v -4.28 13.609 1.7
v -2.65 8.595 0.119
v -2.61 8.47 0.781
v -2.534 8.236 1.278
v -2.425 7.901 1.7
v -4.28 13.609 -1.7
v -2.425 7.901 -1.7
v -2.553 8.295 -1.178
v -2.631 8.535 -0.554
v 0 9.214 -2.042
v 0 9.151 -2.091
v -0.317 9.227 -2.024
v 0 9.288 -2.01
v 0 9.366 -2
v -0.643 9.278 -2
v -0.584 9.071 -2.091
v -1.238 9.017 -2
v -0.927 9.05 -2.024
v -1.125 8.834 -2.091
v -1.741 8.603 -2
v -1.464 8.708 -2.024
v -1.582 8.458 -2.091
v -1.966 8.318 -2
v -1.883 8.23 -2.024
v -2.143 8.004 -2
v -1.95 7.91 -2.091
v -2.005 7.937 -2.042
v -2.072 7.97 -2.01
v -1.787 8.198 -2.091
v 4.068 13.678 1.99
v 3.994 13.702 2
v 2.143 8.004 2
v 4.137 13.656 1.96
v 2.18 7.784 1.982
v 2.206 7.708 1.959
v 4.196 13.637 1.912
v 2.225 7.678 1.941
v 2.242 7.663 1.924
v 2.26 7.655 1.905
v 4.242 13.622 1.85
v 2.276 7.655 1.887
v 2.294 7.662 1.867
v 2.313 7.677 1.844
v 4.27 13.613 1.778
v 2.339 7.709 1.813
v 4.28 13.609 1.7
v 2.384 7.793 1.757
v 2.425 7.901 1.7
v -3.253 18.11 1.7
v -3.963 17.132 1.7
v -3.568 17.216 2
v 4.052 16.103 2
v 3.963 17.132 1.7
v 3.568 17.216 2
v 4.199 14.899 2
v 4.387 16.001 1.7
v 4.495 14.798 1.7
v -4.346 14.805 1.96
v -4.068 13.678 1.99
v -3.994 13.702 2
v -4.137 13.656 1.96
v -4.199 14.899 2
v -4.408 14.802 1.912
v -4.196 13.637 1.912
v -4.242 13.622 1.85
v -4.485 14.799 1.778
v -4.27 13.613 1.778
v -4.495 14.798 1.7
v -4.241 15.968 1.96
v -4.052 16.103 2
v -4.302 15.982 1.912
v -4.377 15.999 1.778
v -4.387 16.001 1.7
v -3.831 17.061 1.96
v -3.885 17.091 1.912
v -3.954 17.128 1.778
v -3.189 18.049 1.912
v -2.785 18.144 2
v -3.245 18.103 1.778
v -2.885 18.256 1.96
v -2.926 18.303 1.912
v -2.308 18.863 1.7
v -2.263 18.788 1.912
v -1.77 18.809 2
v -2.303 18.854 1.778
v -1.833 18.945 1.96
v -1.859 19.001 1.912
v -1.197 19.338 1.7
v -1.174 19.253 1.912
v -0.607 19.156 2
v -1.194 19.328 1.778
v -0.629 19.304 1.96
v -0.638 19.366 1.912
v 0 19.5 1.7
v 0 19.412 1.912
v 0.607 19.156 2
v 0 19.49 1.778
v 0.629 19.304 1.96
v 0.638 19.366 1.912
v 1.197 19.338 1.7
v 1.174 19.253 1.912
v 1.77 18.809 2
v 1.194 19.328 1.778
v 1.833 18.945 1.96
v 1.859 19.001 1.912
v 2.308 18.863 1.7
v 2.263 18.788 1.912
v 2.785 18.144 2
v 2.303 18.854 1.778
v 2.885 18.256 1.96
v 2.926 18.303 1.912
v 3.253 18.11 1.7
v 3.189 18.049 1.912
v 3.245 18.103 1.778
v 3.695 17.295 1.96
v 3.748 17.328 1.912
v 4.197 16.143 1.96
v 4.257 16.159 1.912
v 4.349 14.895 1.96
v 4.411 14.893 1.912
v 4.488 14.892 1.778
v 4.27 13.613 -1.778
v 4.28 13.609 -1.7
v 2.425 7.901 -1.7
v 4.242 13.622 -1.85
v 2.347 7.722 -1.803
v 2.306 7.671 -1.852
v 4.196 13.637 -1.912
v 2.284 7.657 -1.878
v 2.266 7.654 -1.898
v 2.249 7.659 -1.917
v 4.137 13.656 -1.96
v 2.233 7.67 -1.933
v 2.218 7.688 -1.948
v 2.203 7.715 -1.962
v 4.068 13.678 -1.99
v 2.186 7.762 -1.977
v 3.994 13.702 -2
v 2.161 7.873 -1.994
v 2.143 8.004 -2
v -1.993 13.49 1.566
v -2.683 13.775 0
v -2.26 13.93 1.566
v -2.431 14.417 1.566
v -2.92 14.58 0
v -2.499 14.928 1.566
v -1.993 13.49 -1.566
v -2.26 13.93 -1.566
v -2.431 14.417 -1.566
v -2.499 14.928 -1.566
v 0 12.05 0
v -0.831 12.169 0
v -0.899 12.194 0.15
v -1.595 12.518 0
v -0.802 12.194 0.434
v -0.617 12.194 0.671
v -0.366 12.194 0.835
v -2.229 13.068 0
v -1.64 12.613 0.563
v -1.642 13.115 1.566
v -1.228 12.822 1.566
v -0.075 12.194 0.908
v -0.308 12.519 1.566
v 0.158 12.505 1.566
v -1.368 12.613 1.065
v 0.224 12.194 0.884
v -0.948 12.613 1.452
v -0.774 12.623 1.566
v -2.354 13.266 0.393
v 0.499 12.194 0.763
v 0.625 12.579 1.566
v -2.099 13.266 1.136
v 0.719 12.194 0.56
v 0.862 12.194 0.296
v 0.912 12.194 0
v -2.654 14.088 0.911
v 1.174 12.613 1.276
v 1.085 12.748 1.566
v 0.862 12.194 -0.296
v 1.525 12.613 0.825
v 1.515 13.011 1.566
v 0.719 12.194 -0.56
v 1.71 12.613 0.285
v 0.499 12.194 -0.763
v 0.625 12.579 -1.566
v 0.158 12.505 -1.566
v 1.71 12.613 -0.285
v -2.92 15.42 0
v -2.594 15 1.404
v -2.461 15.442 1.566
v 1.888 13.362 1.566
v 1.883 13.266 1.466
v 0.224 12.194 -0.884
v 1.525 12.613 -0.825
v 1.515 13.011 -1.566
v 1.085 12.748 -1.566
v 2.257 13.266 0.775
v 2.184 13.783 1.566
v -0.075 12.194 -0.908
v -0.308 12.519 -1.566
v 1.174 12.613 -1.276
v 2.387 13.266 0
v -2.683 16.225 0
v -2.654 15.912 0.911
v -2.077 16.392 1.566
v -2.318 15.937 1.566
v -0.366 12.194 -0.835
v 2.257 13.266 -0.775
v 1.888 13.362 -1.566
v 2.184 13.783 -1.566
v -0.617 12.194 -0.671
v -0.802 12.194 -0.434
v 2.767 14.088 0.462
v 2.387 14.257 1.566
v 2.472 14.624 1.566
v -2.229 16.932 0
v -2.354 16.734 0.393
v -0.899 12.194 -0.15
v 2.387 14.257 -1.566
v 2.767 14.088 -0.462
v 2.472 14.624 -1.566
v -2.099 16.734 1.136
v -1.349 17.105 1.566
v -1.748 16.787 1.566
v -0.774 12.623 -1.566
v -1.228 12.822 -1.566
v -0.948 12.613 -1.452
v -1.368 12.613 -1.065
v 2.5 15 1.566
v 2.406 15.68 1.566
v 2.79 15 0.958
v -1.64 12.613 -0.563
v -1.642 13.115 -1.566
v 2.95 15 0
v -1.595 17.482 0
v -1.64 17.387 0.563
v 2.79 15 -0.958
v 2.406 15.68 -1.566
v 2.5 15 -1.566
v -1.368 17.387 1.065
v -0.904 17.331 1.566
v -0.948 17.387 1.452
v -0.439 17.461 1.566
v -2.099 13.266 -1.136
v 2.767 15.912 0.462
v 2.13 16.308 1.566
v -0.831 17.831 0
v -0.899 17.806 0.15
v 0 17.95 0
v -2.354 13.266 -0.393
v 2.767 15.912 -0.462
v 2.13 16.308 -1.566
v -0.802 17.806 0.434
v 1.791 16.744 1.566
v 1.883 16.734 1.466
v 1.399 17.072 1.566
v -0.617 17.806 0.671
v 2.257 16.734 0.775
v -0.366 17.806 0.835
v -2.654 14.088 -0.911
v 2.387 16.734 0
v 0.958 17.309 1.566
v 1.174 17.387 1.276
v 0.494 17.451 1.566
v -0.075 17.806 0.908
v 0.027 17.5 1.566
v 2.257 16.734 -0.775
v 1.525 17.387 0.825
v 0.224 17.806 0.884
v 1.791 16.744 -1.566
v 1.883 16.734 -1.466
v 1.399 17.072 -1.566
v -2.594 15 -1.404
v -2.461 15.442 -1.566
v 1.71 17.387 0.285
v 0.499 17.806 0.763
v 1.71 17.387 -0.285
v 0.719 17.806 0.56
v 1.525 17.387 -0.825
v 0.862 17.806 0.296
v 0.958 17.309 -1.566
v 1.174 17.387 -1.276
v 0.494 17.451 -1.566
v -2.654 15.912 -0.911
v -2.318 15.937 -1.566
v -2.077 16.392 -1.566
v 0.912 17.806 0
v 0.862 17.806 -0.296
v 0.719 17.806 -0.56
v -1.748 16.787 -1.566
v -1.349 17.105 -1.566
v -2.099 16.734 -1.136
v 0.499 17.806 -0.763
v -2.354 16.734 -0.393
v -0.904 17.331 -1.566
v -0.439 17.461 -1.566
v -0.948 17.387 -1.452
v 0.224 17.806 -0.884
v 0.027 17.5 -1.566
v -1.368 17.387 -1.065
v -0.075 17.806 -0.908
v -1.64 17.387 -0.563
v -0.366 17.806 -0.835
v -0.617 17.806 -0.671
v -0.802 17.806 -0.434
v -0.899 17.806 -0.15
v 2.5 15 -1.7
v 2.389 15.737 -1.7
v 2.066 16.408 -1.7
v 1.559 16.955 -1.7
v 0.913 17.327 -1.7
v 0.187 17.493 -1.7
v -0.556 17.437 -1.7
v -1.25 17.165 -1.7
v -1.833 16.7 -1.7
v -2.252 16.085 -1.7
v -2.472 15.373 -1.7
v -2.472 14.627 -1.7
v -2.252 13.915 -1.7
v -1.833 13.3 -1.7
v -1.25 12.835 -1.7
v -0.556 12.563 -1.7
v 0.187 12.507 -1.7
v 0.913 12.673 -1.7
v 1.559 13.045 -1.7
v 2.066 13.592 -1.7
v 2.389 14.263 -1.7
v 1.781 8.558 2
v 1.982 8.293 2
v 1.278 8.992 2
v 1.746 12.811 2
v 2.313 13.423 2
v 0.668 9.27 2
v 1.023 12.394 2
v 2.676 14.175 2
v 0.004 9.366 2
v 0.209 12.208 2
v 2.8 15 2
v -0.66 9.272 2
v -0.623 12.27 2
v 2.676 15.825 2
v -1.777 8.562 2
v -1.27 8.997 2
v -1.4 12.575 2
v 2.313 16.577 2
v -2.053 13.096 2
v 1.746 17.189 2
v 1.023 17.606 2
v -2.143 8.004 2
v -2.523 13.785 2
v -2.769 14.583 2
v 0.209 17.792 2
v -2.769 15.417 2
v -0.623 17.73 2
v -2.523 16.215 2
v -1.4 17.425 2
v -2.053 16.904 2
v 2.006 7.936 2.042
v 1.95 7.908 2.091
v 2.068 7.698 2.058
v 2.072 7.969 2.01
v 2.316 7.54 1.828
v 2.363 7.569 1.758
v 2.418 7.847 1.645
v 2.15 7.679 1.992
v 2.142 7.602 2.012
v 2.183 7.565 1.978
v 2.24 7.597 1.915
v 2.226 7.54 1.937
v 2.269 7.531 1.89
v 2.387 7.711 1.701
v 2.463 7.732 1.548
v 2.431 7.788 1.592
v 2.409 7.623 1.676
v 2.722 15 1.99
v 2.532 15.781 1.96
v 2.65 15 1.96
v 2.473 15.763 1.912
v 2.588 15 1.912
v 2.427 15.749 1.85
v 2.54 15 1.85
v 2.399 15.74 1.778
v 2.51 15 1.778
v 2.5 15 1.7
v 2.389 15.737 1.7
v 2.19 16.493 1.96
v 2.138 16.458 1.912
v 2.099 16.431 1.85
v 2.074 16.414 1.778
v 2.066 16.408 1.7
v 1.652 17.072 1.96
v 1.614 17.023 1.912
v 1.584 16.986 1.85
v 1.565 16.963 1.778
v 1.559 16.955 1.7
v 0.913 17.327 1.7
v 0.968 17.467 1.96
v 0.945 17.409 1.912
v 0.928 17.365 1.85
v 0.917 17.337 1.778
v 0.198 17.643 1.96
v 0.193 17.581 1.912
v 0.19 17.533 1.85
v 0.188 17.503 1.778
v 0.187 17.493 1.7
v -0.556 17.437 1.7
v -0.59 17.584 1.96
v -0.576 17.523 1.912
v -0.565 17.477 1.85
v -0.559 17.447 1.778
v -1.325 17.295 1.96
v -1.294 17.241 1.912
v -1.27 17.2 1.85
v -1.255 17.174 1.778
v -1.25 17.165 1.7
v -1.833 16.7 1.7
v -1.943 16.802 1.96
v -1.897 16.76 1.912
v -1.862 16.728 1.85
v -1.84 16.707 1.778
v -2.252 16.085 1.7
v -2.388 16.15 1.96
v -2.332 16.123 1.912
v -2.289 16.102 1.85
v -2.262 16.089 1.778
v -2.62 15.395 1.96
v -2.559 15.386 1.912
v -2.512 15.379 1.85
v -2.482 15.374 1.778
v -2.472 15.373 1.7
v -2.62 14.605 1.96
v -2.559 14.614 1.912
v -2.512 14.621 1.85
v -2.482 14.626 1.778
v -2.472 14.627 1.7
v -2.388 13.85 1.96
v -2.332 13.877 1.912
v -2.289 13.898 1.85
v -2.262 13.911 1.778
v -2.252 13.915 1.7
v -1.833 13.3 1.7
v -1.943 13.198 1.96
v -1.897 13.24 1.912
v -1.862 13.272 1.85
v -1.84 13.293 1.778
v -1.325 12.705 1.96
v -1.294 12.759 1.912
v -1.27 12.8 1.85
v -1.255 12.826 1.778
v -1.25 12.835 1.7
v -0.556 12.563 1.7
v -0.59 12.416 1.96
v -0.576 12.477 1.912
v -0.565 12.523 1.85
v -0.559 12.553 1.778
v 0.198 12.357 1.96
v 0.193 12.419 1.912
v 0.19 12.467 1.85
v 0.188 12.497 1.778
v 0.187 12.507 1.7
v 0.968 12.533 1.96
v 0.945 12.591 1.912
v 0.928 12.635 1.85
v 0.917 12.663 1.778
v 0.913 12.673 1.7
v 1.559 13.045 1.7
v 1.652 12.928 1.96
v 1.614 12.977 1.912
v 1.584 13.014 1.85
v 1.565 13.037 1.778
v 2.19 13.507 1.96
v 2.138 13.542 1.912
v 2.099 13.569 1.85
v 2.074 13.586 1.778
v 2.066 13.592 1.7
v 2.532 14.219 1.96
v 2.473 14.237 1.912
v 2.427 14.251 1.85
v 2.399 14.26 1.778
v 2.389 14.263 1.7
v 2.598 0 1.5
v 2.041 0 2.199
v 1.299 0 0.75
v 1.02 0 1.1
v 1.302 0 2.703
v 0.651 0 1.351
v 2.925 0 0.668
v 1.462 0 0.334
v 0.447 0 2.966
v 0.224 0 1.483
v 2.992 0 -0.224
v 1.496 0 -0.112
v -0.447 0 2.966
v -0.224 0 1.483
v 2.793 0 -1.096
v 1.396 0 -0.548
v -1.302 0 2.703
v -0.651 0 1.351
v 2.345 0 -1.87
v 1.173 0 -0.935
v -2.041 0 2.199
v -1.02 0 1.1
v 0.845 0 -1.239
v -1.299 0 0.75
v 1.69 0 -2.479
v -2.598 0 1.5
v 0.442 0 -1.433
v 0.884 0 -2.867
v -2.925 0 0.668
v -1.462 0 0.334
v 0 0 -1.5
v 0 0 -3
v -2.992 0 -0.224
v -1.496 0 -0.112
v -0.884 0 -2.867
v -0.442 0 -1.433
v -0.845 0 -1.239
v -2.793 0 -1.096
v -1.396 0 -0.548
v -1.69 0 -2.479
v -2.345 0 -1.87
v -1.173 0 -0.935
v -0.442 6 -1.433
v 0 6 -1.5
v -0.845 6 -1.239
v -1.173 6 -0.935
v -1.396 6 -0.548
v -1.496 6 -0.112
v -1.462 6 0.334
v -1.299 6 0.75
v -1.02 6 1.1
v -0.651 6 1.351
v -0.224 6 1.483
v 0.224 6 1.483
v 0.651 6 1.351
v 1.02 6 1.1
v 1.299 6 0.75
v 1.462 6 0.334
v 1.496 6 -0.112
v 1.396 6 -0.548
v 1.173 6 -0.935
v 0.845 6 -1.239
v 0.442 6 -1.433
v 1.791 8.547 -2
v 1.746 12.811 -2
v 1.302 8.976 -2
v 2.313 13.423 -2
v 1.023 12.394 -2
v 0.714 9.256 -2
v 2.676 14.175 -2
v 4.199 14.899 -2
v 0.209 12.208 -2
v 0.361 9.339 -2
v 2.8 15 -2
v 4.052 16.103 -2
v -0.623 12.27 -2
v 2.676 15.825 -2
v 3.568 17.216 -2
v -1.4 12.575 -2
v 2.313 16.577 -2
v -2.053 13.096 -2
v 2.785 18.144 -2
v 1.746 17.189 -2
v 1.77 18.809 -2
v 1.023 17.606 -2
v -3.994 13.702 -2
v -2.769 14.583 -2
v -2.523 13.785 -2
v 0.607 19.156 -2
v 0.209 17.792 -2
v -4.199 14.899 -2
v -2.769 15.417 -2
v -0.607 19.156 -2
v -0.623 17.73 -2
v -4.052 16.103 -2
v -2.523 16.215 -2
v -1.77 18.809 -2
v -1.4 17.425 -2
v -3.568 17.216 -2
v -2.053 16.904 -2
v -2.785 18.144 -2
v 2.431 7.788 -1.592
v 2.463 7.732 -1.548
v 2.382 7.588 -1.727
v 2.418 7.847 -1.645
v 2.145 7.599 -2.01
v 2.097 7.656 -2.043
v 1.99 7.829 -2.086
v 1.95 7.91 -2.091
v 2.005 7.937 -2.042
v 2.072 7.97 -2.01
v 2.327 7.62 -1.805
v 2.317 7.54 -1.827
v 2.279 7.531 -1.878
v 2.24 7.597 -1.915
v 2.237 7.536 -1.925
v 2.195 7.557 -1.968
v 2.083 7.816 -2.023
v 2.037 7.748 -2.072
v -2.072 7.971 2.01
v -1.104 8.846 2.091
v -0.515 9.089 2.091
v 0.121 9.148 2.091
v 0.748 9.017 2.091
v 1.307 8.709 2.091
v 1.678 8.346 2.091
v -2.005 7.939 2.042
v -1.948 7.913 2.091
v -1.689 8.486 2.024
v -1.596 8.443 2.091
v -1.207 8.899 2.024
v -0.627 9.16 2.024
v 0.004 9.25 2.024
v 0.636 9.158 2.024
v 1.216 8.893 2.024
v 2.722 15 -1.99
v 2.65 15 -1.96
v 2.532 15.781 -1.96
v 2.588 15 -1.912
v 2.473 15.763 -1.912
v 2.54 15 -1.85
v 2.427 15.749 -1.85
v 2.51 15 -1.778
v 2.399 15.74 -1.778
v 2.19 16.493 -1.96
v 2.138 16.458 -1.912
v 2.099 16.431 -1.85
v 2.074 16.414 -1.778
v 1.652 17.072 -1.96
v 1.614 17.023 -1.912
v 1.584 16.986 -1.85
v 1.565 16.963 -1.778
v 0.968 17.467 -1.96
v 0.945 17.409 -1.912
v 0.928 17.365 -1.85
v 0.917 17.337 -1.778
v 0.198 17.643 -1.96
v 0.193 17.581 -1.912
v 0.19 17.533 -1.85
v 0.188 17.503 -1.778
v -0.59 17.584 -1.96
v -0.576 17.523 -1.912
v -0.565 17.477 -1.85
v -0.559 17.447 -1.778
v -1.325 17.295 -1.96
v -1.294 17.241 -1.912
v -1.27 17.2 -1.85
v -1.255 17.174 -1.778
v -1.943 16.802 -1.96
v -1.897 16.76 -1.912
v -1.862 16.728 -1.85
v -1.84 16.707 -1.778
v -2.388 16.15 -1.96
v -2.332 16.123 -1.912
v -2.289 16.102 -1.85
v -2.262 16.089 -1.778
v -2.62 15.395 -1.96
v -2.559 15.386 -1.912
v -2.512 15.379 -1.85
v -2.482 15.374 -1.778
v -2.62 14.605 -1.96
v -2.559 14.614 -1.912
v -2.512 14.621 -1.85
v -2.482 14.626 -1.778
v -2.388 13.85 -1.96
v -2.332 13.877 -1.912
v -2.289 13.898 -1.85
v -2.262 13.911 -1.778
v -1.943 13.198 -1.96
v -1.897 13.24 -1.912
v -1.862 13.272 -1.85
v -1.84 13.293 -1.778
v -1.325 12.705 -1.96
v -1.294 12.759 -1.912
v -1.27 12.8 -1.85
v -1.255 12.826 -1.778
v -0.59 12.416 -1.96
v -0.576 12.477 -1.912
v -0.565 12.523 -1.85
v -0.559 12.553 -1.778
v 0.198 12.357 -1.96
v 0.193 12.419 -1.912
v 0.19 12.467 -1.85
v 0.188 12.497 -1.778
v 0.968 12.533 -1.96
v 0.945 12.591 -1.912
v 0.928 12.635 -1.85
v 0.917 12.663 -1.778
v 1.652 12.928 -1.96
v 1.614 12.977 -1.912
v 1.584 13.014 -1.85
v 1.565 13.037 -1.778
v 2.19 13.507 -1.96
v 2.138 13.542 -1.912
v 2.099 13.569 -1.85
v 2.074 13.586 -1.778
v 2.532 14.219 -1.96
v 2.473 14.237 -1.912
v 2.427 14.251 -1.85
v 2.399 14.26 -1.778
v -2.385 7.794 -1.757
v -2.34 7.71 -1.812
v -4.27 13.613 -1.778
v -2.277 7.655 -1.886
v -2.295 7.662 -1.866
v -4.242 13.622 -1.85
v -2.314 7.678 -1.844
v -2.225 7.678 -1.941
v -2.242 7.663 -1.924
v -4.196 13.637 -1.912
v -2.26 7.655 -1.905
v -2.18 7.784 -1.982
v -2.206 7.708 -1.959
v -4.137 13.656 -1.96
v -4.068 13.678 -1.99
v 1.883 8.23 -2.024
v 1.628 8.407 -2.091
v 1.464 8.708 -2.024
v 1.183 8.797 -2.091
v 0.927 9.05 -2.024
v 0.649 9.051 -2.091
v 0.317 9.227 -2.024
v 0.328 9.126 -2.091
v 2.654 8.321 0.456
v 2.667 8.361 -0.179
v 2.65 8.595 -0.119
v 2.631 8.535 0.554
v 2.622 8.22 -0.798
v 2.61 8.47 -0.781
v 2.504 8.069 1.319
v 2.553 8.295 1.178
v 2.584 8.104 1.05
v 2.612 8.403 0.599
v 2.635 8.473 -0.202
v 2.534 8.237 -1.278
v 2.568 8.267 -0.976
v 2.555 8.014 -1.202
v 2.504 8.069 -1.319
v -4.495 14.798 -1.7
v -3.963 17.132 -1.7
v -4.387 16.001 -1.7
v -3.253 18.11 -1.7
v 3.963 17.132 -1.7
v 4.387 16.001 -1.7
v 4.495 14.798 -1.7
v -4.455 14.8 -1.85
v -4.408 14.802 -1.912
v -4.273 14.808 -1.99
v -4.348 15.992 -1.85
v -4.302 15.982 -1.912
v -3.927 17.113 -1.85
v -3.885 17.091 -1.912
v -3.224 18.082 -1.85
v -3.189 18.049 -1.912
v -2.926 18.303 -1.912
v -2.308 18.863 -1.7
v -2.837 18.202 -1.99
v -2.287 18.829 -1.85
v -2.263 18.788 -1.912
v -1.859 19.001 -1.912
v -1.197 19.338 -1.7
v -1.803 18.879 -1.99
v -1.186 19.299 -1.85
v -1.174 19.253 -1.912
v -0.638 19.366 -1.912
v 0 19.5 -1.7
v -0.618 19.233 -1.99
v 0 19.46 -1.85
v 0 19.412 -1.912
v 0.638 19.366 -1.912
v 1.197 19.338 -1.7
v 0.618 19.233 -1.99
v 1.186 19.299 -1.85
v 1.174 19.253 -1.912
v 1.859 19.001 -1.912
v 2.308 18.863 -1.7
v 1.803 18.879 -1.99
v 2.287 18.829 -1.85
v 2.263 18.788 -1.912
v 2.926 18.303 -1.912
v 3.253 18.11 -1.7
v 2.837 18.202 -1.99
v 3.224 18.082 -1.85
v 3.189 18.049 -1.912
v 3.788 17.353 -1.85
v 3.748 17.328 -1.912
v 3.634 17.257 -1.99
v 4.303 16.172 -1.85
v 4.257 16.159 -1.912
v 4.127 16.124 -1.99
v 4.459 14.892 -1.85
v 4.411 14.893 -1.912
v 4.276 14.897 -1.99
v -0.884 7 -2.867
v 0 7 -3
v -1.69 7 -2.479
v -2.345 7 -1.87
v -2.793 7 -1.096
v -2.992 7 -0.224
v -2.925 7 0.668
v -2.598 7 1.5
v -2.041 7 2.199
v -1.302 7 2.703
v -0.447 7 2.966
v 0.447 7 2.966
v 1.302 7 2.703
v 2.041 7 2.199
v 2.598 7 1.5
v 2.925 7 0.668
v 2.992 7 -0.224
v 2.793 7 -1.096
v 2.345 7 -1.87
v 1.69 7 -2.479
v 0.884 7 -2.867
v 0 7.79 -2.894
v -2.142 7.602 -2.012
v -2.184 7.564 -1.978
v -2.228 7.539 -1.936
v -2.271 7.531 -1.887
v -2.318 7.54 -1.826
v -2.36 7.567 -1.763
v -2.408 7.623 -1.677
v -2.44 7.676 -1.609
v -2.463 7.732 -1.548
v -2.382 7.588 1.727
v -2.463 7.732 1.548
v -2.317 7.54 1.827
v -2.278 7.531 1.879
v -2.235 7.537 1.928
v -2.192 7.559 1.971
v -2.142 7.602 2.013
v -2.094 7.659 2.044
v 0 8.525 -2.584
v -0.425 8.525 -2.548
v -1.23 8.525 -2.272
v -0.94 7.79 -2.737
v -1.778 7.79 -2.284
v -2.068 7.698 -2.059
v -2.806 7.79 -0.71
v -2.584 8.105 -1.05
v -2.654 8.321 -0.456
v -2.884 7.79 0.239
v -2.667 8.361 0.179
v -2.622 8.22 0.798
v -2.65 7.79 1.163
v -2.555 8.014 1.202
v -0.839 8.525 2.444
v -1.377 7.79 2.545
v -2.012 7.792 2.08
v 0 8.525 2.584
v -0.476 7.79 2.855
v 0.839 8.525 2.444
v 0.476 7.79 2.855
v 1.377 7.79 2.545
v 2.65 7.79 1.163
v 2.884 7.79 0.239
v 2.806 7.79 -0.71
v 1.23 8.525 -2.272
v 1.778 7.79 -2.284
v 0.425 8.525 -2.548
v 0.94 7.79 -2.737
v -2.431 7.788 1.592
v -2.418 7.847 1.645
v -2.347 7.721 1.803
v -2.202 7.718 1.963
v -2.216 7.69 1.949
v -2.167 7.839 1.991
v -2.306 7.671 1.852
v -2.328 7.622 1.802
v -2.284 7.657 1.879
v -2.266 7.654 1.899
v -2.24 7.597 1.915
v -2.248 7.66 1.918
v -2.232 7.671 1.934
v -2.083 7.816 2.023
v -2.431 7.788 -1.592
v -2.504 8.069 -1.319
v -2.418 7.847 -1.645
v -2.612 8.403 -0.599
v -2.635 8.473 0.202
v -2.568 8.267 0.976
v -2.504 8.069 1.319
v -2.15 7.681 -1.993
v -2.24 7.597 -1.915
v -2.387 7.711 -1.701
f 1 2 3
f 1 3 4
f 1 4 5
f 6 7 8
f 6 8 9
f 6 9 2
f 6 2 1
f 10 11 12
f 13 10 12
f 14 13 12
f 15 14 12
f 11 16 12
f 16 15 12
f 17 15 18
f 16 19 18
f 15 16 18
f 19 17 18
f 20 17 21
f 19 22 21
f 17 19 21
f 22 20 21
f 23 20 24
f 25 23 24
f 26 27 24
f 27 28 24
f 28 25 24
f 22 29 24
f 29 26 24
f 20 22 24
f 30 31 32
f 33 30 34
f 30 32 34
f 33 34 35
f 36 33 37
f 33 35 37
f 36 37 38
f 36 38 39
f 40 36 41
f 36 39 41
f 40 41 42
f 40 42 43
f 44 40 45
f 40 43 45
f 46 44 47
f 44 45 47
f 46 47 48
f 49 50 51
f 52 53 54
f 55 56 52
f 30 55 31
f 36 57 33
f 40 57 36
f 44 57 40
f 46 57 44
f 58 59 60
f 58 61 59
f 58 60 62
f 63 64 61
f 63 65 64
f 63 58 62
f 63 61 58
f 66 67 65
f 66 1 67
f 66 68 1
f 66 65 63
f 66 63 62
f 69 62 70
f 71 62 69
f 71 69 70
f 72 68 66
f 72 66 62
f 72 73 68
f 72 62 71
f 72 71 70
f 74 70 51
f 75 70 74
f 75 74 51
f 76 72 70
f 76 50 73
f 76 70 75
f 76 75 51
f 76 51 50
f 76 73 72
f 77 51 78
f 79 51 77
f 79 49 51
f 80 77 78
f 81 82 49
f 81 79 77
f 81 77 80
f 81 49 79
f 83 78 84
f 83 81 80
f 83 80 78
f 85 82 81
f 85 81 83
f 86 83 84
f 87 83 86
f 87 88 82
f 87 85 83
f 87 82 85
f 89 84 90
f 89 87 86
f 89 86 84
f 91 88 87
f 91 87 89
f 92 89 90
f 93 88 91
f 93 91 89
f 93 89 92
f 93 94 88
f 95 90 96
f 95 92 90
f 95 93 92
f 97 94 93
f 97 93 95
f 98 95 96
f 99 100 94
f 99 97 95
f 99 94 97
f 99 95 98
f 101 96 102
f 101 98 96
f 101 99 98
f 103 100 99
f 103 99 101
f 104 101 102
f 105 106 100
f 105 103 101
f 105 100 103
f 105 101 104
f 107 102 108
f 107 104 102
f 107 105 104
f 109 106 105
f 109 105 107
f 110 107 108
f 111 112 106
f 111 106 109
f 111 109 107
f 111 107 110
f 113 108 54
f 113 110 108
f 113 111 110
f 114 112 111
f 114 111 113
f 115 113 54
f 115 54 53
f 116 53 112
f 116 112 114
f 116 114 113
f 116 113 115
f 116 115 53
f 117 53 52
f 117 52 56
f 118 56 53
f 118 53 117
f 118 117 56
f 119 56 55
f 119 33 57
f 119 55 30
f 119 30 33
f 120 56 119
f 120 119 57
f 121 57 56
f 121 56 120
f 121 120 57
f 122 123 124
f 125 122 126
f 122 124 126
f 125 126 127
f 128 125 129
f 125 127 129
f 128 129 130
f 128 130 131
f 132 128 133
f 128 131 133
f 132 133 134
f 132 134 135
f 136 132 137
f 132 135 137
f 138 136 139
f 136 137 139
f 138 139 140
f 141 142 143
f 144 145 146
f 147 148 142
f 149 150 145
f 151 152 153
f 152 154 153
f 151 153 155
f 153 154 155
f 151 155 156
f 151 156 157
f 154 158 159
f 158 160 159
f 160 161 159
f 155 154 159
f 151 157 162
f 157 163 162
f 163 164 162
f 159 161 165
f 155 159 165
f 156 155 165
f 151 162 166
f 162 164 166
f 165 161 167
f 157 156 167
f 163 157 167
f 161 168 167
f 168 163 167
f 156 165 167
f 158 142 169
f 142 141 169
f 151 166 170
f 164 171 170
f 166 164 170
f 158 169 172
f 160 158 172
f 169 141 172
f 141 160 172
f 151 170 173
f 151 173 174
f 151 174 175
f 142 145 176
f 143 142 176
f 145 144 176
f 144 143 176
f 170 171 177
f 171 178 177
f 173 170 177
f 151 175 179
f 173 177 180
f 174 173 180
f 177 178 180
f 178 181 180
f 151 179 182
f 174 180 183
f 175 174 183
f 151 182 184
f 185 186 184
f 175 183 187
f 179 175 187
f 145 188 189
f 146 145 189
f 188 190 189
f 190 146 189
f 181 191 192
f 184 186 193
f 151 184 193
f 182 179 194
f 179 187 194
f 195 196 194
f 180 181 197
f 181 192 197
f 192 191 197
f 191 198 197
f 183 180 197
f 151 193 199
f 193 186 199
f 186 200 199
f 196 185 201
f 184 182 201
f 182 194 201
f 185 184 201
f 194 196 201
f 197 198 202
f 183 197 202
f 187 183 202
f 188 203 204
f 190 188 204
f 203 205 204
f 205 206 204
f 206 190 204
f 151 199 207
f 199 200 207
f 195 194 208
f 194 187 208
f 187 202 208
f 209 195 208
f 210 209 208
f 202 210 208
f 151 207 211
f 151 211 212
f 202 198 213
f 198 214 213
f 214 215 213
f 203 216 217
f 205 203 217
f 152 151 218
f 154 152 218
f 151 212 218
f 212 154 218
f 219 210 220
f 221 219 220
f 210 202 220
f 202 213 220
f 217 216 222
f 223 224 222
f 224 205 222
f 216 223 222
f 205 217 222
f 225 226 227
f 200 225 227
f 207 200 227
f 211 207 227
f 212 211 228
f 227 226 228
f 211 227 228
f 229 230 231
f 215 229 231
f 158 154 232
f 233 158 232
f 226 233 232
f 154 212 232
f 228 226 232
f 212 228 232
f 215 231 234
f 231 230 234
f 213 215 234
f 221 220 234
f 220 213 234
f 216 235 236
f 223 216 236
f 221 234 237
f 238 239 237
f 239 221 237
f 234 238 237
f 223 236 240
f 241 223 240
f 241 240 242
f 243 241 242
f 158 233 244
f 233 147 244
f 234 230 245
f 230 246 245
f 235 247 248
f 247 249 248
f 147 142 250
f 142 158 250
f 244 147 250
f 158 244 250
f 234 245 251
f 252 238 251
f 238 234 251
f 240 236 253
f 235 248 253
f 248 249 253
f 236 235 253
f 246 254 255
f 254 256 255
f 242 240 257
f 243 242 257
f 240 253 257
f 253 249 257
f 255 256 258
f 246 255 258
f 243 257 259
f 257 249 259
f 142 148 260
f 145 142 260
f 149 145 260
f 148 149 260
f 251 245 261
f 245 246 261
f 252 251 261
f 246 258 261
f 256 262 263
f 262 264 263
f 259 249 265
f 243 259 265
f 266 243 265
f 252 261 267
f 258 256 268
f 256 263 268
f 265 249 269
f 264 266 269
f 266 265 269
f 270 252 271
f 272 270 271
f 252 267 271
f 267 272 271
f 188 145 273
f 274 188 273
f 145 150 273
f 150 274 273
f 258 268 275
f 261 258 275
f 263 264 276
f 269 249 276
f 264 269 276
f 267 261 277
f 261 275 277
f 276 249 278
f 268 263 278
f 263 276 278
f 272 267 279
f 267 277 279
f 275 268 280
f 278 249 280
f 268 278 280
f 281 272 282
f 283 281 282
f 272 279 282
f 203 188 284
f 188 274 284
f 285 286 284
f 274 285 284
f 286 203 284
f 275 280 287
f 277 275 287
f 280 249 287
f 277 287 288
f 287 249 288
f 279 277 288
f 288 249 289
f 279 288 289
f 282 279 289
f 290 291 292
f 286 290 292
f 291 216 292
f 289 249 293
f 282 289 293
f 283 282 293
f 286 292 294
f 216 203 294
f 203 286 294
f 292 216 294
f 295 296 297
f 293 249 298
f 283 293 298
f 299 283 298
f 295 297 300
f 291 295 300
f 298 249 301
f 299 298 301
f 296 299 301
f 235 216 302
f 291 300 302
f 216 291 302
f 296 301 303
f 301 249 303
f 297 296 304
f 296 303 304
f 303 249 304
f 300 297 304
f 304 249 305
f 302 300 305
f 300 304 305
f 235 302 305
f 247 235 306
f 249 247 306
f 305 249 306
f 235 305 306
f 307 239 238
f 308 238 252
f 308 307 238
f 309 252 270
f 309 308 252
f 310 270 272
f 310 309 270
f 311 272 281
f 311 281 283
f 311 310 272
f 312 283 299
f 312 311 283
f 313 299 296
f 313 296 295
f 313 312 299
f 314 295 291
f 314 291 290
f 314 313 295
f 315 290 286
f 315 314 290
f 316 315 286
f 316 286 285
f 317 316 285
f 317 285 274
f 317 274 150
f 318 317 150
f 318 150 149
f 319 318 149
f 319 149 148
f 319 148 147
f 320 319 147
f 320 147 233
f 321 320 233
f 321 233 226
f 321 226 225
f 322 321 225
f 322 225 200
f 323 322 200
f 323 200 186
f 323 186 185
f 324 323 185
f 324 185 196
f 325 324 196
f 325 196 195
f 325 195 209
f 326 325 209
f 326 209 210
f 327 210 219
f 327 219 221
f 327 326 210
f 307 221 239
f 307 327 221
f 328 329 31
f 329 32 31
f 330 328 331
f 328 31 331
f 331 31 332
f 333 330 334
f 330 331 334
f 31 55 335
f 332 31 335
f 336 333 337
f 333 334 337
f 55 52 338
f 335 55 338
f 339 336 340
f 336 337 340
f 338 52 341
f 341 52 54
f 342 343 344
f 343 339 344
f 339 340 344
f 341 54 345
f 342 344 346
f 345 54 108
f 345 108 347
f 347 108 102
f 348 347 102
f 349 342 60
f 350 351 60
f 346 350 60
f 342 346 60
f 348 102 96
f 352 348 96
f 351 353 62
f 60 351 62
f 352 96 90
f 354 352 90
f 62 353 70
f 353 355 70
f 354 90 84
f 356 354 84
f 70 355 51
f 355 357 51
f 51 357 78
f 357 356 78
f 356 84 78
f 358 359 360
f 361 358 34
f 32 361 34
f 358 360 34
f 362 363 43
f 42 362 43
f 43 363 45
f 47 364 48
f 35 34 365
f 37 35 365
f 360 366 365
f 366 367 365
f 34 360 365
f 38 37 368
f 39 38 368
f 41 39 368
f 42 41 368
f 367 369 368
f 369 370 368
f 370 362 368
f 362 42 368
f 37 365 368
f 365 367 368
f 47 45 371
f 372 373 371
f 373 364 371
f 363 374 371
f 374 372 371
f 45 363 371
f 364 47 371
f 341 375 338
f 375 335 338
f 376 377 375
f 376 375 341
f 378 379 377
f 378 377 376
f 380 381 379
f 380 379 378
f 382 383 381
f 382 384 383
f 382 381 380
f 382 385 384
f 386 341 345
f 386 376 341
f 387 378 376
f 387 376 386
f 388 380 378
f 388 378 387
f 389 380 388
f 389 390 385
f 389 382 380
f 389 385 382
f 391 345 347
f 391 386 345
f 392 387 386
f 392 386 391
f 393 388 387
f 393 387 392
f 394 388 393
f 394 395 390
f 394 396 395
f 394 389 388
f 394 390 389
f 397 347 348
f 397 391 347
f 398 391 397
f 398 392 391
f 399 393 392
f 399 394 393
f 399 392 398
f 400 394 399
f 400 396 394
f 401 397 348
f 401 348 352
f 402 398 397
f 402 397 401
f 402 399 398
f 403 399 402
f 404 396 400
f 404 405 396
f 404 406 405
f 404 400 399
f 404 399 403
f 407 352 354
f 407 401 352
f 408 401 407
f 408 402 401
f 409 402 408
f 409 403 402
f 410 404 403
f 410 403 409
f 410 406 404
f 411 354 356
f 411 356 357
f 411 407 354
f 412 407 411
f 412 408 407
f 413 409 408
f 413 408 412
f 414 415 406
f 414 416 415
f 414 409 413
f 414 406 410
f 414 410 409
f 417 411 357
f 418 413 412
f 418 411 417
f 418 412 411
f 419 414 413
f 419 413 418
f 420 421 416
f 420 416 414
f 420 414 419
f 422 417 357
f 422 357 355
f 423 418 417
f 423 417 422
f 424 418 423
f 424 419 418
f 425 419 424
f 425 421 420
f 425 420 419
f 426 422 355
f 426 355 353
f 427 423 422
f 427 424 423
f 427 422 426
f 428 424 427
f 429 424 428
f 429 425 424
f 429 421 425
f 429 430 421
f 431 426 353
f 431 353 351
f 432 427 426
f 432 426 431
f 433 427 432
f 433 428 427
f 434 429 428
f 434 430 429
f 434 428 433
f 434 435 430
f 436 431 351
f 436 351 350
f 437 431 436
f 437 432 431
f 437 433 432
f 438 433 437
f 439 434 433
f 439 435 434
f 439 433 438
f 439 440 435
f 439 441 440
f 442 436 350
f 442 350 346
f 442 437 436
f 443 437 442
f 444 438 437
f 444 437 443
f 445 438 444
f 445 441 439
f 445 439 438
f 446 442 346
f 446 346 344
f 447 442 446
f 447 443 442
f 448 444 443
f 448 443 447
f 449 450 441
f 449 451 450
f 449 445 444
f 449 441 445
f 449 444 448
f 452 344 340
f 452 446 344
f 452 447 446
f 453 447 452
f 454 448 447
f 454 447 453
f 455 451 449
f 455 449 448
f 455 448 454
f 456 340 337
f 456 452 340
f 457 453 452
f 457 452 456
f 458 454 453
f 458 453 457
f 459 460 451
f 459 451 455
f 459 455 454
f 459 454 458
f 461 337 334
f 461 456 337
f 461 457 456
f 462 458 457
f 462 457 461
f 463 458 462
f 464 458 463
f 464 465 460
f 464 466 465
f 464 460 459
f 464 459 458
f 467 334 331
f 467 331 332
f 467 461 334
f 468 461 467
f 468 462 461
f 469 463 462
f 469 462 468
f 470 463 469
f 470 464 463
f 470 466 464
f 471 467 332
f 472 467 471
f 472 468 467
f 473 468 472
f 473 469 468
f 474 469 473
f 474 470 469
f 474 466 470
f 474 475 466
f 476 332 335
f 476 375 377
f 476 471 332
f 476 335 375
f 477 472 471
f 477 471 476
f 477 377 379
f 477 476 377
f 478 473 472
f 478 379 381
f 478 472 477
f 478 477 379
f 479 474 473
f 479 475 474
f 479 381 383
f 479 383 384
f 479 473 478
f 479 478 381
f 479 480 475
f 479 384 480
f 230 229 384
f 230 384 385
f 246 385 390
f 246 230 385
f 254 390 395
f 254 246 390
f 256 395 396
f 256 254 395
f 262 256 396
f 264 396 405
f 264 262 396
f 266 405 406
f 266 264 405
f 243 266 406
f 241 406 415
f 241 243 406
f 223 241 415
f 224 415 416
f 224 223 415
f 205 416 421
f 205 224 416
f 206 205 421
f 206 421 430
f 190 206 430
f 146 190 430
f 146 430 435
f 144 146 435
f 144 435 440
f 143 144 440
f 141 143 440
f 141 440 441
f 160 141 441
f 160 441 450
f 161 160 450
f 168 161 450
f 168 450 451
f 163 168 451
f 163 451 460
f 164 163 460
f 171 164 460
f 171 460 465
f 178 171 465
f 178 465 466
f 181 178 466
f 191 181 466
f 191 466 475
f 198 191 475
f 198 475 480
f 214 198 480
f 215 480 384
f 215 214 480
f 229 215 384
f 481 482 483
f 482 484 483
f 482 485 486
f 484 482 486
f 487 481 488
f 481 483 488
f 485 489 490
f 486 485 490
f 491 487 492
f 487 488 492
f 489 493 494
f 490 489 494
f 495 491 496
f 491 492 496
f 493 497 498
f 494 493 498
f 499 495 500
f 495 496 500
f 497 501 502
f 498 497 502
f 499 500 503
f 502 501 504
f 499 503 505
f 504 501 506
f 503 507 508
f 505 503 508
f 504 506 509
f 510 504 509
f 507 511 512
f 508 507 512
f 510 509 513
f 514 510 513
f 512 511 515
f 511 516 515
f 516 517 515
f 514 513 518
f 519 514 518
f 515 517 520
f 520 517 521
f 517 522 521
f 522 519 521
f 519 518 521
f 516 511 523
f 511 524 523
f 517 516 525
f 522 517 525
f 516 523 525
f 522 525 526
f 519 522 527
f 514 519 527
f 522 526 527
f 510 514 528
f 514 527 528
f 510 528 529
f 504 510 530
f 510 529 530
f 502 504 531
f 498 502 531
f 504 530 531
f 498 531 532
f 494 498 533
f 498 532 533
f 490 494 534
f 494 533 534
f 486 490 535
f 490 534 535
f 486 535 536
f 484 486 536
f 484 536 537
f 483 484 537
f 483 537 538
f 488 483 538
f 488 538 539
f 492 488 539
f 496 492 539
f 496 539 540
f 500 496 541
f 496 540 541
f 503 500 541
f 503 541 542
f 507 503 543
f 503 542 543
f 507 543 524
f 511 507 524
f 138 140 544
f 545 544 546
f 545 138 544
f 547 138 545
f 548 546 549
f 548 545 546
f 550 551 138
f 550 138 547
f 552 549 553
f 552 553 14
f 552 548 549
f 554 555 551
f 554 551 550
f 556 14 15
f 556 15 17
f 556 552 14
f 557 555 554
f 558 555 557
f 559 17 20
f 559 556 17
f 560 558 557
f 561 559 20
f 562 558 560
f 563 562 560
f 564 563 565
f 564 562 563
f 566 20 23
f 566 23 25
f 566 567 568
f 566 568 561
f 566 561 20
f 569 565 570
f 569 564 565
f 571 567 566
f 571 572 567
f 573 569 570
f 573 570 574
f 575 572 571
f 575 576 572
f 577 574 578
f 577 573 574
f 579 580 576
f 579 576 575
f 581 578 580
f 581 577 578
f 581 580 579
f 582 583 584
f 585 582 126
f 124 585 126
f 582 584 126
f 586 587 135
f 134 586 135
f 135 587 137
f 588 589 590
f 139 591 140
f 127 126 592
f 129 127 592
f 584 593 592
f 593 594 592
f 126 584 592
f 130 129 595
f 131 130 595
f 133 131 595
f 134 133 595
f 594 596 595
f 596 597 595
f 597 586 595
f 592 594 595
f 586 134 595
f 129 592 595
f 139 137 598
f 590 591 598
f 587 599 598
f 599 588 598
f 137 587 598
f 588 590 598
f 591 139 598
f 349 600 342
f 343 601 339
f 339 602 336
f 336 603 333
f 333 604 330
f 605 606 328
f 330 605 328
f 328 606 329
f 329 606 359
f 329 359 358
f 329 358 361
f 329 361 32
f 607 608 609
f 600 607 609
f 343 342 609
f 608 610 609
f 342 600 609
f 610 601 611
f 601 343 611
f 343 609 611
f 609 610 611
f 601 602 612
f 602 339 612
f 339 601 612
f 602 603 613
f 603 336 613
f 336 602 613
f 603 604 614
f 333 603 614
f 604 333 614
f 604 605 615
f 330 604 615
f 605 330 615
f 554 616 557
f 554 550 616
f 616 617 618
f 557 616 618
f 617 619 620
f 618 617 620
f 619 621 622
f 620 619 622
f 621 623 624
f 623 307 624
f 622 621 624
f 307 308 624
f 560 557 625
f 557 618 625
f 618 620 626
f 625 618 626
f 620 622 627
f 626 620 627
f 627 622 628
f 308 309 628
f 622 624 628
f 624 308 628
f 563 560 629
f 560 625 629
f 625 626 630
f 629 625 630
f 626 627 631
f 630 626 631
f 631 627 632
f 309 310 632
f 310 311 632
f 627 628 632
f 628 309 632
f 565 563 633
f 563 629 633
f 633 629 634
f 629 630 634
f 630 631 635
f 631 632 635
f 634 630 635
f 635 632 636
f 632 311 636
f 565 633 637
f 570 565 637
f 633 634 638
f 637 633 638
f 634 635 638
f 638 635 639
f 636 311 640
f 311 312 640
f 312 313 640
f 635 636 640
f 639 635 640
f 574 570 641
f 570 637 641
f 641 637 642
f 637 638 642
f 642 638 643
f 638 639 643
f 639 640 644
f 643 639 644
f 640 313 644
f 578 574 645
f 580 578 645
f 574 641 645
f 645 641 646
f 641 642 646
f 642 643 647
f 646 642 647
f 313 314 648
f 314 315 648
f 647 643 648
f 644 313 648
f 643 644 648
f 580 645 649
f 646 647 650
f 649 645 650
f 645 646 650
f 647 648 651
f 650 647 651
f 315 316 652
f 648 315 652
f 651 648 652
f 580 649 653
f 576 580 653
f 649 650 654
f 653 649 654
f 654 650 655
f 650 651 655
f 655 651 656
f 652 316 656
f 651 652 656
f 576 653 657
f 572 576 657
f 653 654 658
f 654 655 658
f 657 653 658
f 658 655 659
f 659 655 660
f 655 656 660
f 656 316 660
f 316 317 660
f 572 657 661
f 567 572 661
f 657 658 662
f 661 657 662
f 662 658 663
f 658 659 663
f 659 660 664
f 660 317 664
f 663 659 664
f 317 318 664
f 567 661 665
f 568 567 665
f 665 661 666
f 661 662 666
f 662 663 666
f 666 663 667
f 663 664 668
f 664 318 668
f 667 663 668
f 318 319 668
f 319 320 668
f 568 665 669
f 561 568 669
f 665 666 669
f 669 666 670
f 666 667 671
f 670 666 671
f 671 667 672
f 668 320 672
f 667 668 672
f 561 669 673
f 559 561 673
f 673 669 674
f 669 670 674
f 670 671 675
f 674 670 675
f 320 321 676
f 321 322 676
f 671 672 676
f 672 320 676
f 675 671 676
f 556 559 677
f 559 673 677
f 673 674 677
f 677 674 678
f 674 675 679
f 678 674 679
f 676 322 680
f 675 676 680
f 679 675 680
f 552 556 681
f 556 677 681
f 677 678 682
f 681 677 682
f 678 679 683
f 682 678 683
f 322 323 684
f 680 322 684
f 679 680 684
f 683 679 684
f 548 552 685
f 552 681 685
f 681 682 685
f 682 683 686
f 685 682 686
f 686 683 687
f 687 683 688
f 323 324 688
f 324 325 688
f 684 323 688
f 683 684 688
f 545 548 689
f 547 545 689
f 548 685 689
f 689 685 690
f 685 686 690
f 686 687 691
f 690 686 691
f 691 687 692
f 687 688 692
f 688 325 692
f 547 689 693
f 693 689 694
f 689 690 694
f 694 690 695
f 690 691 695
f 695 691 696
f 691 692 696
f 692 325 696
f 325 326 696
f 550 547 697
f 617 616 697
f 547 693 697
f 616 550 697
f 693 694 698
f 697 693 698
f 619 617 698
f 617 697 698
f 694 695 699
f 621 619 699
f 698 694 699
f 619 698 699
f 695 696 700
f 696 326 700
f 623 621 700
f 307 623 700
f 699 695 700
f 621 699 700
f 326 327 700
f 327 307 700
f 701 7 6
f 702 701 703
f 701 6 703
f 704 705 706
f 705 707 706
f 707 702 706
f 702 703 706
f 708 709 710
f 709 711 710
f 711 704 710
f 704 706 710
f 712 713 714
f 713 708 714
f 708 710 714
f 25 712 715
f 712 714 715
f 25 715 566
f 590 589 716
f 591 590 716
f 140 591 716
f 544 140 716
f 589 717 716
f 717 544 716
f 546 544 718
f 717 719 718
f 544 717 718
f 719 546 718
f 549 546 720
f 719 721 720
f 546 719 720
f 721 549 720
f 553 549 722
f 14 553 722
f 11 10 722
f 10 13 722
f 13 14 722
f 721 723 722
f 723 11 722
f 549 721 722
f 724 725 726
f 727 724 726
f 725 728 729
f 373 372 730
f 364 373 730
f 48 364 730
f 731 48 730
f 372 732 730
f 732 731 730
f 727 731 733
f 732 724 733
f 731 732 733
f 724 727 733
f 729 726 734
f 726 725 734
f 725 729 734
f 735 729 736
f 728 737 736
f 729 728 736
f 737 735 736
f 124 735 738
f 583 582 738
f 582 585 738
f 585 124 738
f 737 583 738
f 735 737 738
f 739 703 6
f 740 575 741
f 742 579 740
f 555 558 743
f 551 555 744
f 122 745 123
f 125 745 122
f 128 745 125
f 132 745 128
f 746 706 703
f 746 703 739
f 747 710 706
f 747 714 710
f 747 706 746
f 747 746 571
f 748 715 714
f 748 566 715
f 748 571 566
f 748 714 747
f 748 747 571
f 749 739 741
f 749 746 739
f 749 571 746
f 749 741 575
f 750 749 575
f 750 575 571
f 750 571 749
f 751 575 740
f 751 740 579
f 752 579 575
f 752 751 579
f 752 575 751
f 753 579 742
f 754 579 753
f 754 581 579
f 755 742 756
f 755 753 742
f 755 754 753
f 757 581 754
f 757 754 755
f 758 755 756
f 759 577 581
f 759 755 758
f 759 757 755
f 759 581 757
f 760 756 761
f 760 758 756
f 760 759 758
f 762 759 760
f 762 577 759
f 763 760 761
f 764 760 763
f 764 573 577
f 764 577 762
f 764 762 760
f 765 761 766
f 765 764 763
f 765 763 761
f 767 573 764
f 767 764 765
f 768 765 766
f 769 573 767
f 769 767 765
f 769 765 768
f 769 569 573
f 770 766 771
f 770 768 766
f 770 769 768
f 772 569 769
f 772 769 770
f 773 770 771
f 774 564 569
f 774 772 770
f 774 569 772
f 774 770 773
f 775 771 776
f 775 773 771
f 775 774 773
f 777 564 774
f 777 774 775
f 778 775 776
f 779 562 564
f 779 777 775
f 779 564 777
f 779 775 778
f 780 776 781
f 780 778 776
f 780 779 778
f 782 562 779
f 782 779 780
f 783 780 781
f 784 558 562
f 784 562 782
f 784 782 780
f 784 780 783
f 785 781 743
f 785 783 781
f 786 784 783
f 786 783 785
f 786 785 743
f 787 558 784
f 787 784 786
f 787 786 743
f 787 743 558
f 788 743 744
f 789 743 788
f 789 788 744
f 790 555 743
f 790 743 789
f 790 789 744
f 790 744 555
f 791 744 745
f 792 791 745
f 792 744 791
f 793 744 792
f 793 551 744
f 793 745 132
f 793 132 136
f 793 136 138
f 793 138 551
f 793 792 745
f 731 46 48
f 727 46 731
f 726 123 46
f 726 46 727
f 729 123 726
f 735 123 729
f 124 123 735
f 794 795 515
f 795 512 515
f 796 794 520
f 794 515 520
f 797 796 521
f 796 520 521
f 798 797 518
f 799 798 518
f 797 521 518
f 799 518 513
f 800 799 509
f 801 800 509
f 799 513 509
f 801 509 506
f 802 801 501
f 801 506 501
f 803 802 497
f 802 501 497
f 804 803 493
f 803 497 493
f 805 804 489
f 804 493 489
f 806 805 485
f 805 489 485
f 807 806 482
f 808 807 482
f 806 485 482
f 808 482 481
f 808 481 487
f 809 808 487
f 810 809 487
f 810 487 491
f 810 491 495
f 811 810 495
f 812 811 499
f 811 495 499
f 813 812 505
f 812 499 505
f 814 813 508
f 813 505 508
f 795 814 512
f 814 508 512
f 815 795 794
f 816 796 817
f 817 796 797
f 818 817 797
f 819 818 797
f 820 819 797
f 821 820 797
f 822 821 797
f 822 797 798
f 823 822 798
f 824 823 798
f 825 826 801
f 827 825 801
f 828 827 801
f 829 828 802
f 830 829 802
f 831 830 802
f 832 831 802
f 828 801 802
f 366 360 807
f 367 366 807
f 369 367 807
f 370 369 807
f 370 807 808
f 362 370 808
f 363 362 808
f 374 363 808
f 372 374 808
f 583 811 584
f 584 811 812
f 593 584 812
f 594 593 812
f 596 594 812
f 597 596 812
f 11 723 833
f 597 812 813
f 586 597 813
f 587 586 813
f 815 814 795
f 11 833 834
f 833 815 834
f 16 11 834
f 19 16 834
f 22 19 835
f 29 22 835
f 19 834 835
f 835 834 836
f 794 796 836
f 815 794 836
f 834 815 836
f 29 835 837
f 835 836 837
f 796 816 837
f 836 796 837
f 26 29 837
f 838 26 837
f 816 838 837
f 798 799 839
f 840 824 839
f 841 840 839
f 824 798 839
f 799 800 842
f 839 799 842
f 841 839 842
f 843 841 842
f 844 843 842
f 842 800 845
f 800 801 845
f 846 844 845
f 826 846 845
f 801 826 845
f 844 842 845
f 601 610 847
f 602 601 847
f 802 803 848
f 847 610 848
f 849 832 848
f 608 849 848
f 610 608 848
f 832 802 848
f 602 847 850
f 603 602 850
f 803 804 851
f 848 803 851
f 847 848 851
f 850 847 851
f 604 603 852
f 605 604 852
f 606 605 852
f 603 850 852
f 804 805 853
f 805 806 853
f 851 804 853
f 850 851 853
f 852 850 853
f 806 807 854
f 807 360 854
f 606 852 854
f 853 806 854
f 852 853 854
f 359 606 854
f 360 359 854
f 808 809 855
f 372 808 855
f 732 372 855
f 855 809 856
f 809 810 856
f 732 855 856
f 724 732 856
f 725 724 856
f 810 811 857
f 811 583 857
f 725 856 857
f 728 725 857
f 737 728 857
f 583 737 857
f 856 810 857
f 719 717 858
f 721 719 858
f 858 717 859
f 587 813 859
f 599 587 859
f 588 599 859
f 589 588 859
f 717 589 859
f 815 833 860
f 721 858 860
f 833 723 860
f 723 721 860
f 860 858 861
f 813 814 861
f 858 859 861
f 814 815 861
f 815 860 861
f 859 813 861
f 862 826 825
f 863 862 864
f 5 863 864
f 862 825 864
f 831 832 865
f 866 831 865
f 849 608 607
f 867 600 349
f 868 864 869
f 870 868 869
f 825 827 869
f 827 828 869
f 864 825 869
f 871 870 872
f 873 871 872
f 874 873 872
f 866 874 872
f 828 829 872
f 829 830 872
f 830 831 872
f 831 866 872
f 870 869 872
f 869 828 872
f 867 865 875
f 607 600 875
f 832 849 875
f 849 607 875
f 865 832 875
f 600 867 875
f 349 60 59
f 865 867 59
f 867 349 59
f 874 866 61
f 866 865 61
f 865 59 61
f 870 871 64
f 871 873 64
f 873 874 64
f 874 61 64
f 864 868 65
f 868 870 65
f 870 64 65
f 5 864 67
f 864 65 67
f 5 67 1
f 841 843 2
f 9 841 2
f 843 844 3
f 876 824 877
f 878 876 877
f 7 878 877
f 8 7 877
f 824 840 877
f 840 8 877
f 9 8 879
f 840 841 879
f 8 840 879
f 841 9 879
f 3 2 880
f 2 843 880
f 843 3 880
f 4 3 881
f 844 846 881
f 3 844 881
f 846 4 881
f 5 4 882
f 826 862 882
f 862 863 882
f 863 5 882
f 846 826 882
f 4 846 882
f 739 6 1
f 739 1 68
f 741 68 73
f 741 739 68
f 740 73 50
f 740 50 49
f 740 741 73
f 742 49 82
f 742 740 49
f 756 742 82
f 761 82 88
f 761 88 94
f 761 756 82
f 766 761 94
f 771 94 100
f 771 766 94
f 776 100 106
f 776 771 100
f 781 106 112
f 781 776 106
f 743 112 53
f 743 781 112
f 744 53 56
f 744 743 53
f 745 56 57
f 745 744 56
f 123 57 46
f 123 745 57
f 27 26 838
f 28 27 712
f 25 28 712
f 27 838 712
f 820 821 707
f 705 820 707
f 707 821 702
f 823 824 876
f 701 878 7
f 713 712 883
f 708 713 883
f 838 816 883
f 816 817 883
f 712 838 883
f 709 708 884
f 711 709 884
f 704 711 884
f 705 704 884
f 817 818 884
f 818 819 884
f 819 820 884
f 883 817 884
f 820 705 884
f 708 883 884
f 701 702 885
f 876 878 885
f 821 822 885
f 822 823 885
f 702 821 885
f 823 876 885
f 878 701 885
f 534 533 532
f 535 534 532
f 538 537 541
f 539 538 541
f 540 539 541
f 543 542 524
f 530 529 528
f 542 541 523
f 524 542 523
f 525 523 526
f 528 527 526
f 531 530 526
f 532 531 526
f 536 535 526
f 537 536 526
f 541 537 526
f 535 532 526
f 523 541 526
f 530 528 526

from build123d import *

# Parameters (mm, degrees)
BOSS_EXTRU_1_DEPTH      = 2
BOSS_EXTRU_1_DEPTH_BACK = 2
ESQUISSE2_R             = 2.5
CONG_1_R                = 0.3


with BuildPart() as part:
    # Esquisse1 → Révolution1 (revolve)
    with BuildSketch(Plane.XY):
        with BuildLine():
            Line((0, 6), (0, 10))
            ThreePointArc((0, 10), (-2.121320344, 9.121320344), (-3, 7))
            Line((-3, 7), (-3, 0))
            Line((-3, 0), (-1.5, 0))
            Line((-1.5, 0), (-1.5, 6))
            Line((-1.5, 6), (0, 6))
        make_face()
    revolve(axis=Axis((0, -0.674983233, 0), (0, 1, 0)))

    # Esquisse2 → Boss.-Extru.1 (add, two sides: drawn at the far end of the back side and taken through both)
    with BuildSketch(Plane.XY.offset(-BOSS_EXTRU_1_DEPTH_BACK)):
        with BuildLine():
            Line((-2.132222439, 7), (-4.279754323, 13.609423525))
            ThreePointArc((-4.279754323, 13.609423525), (0, 19.5), (4.279754323, 13.609423525))
            Line((4.279754323, 13.609423525), (2.132222439, 7))
            Line((2.132222439, 7), (-2.132222439, 7))
        make_face()
        with Locations((0, 15)):
            Circle(ESQUISSE2_R, mode=Mode.SUBTRACT)
    extrude(amount=BOSS_EXTRU_1_DEPTH + BOSS_EXTRU_1_DEPTH_BACK)

    # Esquisse3 → Enlèvement de matière-Révolution1 (revolve, cut)
    with BuildSketch(Plane.XY):
        with BuildLine():
            Line((0, 17.95), (0, 12.05))
            ThreePointArc((0, 12.05), (-2.95, 15), (0, 17.95))
        make_face()
    revolve(axis=Axis((0, 11.065209796, 0), (0, 1, 0)), mode=Mode.SUBTRACT)

    # Congé1
    cong_1_edges = [part.edges().sort_by_distance(p)[0] for p in [
        (0, 19.5, -2),
        (-3.249763904, 10.439438968, -2),
        (3.249763904, 10.439438968, -2),
        (-2.5, 15, -2),
        (-2.5, 15, 2),
        (-3.249763904, 10.439438968, 2),
        (0, 19.5, 2),
        (3.249763904, 10.439438968, 2),
    ]]
    fillet(cong_1_edges, radius=CONG_1_R)
    cong_1_2_edges = [part.edges().sort_by_distance(p)[0] for p in [
        (-2.547134089, 8.276966755, -0.938863057),
        (2.611797225, 8.475979423, 3.5e-08),
        (2.4e-08, 9.236067977, -2),
        (2.4e-08, 9.236067977, 2),
        (-2.547134089, 8.276966755, 0.938863057),
        (-2.233315922, 7.596093395, 1.912321273),
        (2.233315922, 7.596093395, 1.912321273),
        (-2.233299855, 7.596099057, -1.912338273),
        (2.233299855, 7.596099057, -1.912338273),
    ]]
    fillet(cong_1_2_edges, radius=CONG_1_R)


solid = part.part
